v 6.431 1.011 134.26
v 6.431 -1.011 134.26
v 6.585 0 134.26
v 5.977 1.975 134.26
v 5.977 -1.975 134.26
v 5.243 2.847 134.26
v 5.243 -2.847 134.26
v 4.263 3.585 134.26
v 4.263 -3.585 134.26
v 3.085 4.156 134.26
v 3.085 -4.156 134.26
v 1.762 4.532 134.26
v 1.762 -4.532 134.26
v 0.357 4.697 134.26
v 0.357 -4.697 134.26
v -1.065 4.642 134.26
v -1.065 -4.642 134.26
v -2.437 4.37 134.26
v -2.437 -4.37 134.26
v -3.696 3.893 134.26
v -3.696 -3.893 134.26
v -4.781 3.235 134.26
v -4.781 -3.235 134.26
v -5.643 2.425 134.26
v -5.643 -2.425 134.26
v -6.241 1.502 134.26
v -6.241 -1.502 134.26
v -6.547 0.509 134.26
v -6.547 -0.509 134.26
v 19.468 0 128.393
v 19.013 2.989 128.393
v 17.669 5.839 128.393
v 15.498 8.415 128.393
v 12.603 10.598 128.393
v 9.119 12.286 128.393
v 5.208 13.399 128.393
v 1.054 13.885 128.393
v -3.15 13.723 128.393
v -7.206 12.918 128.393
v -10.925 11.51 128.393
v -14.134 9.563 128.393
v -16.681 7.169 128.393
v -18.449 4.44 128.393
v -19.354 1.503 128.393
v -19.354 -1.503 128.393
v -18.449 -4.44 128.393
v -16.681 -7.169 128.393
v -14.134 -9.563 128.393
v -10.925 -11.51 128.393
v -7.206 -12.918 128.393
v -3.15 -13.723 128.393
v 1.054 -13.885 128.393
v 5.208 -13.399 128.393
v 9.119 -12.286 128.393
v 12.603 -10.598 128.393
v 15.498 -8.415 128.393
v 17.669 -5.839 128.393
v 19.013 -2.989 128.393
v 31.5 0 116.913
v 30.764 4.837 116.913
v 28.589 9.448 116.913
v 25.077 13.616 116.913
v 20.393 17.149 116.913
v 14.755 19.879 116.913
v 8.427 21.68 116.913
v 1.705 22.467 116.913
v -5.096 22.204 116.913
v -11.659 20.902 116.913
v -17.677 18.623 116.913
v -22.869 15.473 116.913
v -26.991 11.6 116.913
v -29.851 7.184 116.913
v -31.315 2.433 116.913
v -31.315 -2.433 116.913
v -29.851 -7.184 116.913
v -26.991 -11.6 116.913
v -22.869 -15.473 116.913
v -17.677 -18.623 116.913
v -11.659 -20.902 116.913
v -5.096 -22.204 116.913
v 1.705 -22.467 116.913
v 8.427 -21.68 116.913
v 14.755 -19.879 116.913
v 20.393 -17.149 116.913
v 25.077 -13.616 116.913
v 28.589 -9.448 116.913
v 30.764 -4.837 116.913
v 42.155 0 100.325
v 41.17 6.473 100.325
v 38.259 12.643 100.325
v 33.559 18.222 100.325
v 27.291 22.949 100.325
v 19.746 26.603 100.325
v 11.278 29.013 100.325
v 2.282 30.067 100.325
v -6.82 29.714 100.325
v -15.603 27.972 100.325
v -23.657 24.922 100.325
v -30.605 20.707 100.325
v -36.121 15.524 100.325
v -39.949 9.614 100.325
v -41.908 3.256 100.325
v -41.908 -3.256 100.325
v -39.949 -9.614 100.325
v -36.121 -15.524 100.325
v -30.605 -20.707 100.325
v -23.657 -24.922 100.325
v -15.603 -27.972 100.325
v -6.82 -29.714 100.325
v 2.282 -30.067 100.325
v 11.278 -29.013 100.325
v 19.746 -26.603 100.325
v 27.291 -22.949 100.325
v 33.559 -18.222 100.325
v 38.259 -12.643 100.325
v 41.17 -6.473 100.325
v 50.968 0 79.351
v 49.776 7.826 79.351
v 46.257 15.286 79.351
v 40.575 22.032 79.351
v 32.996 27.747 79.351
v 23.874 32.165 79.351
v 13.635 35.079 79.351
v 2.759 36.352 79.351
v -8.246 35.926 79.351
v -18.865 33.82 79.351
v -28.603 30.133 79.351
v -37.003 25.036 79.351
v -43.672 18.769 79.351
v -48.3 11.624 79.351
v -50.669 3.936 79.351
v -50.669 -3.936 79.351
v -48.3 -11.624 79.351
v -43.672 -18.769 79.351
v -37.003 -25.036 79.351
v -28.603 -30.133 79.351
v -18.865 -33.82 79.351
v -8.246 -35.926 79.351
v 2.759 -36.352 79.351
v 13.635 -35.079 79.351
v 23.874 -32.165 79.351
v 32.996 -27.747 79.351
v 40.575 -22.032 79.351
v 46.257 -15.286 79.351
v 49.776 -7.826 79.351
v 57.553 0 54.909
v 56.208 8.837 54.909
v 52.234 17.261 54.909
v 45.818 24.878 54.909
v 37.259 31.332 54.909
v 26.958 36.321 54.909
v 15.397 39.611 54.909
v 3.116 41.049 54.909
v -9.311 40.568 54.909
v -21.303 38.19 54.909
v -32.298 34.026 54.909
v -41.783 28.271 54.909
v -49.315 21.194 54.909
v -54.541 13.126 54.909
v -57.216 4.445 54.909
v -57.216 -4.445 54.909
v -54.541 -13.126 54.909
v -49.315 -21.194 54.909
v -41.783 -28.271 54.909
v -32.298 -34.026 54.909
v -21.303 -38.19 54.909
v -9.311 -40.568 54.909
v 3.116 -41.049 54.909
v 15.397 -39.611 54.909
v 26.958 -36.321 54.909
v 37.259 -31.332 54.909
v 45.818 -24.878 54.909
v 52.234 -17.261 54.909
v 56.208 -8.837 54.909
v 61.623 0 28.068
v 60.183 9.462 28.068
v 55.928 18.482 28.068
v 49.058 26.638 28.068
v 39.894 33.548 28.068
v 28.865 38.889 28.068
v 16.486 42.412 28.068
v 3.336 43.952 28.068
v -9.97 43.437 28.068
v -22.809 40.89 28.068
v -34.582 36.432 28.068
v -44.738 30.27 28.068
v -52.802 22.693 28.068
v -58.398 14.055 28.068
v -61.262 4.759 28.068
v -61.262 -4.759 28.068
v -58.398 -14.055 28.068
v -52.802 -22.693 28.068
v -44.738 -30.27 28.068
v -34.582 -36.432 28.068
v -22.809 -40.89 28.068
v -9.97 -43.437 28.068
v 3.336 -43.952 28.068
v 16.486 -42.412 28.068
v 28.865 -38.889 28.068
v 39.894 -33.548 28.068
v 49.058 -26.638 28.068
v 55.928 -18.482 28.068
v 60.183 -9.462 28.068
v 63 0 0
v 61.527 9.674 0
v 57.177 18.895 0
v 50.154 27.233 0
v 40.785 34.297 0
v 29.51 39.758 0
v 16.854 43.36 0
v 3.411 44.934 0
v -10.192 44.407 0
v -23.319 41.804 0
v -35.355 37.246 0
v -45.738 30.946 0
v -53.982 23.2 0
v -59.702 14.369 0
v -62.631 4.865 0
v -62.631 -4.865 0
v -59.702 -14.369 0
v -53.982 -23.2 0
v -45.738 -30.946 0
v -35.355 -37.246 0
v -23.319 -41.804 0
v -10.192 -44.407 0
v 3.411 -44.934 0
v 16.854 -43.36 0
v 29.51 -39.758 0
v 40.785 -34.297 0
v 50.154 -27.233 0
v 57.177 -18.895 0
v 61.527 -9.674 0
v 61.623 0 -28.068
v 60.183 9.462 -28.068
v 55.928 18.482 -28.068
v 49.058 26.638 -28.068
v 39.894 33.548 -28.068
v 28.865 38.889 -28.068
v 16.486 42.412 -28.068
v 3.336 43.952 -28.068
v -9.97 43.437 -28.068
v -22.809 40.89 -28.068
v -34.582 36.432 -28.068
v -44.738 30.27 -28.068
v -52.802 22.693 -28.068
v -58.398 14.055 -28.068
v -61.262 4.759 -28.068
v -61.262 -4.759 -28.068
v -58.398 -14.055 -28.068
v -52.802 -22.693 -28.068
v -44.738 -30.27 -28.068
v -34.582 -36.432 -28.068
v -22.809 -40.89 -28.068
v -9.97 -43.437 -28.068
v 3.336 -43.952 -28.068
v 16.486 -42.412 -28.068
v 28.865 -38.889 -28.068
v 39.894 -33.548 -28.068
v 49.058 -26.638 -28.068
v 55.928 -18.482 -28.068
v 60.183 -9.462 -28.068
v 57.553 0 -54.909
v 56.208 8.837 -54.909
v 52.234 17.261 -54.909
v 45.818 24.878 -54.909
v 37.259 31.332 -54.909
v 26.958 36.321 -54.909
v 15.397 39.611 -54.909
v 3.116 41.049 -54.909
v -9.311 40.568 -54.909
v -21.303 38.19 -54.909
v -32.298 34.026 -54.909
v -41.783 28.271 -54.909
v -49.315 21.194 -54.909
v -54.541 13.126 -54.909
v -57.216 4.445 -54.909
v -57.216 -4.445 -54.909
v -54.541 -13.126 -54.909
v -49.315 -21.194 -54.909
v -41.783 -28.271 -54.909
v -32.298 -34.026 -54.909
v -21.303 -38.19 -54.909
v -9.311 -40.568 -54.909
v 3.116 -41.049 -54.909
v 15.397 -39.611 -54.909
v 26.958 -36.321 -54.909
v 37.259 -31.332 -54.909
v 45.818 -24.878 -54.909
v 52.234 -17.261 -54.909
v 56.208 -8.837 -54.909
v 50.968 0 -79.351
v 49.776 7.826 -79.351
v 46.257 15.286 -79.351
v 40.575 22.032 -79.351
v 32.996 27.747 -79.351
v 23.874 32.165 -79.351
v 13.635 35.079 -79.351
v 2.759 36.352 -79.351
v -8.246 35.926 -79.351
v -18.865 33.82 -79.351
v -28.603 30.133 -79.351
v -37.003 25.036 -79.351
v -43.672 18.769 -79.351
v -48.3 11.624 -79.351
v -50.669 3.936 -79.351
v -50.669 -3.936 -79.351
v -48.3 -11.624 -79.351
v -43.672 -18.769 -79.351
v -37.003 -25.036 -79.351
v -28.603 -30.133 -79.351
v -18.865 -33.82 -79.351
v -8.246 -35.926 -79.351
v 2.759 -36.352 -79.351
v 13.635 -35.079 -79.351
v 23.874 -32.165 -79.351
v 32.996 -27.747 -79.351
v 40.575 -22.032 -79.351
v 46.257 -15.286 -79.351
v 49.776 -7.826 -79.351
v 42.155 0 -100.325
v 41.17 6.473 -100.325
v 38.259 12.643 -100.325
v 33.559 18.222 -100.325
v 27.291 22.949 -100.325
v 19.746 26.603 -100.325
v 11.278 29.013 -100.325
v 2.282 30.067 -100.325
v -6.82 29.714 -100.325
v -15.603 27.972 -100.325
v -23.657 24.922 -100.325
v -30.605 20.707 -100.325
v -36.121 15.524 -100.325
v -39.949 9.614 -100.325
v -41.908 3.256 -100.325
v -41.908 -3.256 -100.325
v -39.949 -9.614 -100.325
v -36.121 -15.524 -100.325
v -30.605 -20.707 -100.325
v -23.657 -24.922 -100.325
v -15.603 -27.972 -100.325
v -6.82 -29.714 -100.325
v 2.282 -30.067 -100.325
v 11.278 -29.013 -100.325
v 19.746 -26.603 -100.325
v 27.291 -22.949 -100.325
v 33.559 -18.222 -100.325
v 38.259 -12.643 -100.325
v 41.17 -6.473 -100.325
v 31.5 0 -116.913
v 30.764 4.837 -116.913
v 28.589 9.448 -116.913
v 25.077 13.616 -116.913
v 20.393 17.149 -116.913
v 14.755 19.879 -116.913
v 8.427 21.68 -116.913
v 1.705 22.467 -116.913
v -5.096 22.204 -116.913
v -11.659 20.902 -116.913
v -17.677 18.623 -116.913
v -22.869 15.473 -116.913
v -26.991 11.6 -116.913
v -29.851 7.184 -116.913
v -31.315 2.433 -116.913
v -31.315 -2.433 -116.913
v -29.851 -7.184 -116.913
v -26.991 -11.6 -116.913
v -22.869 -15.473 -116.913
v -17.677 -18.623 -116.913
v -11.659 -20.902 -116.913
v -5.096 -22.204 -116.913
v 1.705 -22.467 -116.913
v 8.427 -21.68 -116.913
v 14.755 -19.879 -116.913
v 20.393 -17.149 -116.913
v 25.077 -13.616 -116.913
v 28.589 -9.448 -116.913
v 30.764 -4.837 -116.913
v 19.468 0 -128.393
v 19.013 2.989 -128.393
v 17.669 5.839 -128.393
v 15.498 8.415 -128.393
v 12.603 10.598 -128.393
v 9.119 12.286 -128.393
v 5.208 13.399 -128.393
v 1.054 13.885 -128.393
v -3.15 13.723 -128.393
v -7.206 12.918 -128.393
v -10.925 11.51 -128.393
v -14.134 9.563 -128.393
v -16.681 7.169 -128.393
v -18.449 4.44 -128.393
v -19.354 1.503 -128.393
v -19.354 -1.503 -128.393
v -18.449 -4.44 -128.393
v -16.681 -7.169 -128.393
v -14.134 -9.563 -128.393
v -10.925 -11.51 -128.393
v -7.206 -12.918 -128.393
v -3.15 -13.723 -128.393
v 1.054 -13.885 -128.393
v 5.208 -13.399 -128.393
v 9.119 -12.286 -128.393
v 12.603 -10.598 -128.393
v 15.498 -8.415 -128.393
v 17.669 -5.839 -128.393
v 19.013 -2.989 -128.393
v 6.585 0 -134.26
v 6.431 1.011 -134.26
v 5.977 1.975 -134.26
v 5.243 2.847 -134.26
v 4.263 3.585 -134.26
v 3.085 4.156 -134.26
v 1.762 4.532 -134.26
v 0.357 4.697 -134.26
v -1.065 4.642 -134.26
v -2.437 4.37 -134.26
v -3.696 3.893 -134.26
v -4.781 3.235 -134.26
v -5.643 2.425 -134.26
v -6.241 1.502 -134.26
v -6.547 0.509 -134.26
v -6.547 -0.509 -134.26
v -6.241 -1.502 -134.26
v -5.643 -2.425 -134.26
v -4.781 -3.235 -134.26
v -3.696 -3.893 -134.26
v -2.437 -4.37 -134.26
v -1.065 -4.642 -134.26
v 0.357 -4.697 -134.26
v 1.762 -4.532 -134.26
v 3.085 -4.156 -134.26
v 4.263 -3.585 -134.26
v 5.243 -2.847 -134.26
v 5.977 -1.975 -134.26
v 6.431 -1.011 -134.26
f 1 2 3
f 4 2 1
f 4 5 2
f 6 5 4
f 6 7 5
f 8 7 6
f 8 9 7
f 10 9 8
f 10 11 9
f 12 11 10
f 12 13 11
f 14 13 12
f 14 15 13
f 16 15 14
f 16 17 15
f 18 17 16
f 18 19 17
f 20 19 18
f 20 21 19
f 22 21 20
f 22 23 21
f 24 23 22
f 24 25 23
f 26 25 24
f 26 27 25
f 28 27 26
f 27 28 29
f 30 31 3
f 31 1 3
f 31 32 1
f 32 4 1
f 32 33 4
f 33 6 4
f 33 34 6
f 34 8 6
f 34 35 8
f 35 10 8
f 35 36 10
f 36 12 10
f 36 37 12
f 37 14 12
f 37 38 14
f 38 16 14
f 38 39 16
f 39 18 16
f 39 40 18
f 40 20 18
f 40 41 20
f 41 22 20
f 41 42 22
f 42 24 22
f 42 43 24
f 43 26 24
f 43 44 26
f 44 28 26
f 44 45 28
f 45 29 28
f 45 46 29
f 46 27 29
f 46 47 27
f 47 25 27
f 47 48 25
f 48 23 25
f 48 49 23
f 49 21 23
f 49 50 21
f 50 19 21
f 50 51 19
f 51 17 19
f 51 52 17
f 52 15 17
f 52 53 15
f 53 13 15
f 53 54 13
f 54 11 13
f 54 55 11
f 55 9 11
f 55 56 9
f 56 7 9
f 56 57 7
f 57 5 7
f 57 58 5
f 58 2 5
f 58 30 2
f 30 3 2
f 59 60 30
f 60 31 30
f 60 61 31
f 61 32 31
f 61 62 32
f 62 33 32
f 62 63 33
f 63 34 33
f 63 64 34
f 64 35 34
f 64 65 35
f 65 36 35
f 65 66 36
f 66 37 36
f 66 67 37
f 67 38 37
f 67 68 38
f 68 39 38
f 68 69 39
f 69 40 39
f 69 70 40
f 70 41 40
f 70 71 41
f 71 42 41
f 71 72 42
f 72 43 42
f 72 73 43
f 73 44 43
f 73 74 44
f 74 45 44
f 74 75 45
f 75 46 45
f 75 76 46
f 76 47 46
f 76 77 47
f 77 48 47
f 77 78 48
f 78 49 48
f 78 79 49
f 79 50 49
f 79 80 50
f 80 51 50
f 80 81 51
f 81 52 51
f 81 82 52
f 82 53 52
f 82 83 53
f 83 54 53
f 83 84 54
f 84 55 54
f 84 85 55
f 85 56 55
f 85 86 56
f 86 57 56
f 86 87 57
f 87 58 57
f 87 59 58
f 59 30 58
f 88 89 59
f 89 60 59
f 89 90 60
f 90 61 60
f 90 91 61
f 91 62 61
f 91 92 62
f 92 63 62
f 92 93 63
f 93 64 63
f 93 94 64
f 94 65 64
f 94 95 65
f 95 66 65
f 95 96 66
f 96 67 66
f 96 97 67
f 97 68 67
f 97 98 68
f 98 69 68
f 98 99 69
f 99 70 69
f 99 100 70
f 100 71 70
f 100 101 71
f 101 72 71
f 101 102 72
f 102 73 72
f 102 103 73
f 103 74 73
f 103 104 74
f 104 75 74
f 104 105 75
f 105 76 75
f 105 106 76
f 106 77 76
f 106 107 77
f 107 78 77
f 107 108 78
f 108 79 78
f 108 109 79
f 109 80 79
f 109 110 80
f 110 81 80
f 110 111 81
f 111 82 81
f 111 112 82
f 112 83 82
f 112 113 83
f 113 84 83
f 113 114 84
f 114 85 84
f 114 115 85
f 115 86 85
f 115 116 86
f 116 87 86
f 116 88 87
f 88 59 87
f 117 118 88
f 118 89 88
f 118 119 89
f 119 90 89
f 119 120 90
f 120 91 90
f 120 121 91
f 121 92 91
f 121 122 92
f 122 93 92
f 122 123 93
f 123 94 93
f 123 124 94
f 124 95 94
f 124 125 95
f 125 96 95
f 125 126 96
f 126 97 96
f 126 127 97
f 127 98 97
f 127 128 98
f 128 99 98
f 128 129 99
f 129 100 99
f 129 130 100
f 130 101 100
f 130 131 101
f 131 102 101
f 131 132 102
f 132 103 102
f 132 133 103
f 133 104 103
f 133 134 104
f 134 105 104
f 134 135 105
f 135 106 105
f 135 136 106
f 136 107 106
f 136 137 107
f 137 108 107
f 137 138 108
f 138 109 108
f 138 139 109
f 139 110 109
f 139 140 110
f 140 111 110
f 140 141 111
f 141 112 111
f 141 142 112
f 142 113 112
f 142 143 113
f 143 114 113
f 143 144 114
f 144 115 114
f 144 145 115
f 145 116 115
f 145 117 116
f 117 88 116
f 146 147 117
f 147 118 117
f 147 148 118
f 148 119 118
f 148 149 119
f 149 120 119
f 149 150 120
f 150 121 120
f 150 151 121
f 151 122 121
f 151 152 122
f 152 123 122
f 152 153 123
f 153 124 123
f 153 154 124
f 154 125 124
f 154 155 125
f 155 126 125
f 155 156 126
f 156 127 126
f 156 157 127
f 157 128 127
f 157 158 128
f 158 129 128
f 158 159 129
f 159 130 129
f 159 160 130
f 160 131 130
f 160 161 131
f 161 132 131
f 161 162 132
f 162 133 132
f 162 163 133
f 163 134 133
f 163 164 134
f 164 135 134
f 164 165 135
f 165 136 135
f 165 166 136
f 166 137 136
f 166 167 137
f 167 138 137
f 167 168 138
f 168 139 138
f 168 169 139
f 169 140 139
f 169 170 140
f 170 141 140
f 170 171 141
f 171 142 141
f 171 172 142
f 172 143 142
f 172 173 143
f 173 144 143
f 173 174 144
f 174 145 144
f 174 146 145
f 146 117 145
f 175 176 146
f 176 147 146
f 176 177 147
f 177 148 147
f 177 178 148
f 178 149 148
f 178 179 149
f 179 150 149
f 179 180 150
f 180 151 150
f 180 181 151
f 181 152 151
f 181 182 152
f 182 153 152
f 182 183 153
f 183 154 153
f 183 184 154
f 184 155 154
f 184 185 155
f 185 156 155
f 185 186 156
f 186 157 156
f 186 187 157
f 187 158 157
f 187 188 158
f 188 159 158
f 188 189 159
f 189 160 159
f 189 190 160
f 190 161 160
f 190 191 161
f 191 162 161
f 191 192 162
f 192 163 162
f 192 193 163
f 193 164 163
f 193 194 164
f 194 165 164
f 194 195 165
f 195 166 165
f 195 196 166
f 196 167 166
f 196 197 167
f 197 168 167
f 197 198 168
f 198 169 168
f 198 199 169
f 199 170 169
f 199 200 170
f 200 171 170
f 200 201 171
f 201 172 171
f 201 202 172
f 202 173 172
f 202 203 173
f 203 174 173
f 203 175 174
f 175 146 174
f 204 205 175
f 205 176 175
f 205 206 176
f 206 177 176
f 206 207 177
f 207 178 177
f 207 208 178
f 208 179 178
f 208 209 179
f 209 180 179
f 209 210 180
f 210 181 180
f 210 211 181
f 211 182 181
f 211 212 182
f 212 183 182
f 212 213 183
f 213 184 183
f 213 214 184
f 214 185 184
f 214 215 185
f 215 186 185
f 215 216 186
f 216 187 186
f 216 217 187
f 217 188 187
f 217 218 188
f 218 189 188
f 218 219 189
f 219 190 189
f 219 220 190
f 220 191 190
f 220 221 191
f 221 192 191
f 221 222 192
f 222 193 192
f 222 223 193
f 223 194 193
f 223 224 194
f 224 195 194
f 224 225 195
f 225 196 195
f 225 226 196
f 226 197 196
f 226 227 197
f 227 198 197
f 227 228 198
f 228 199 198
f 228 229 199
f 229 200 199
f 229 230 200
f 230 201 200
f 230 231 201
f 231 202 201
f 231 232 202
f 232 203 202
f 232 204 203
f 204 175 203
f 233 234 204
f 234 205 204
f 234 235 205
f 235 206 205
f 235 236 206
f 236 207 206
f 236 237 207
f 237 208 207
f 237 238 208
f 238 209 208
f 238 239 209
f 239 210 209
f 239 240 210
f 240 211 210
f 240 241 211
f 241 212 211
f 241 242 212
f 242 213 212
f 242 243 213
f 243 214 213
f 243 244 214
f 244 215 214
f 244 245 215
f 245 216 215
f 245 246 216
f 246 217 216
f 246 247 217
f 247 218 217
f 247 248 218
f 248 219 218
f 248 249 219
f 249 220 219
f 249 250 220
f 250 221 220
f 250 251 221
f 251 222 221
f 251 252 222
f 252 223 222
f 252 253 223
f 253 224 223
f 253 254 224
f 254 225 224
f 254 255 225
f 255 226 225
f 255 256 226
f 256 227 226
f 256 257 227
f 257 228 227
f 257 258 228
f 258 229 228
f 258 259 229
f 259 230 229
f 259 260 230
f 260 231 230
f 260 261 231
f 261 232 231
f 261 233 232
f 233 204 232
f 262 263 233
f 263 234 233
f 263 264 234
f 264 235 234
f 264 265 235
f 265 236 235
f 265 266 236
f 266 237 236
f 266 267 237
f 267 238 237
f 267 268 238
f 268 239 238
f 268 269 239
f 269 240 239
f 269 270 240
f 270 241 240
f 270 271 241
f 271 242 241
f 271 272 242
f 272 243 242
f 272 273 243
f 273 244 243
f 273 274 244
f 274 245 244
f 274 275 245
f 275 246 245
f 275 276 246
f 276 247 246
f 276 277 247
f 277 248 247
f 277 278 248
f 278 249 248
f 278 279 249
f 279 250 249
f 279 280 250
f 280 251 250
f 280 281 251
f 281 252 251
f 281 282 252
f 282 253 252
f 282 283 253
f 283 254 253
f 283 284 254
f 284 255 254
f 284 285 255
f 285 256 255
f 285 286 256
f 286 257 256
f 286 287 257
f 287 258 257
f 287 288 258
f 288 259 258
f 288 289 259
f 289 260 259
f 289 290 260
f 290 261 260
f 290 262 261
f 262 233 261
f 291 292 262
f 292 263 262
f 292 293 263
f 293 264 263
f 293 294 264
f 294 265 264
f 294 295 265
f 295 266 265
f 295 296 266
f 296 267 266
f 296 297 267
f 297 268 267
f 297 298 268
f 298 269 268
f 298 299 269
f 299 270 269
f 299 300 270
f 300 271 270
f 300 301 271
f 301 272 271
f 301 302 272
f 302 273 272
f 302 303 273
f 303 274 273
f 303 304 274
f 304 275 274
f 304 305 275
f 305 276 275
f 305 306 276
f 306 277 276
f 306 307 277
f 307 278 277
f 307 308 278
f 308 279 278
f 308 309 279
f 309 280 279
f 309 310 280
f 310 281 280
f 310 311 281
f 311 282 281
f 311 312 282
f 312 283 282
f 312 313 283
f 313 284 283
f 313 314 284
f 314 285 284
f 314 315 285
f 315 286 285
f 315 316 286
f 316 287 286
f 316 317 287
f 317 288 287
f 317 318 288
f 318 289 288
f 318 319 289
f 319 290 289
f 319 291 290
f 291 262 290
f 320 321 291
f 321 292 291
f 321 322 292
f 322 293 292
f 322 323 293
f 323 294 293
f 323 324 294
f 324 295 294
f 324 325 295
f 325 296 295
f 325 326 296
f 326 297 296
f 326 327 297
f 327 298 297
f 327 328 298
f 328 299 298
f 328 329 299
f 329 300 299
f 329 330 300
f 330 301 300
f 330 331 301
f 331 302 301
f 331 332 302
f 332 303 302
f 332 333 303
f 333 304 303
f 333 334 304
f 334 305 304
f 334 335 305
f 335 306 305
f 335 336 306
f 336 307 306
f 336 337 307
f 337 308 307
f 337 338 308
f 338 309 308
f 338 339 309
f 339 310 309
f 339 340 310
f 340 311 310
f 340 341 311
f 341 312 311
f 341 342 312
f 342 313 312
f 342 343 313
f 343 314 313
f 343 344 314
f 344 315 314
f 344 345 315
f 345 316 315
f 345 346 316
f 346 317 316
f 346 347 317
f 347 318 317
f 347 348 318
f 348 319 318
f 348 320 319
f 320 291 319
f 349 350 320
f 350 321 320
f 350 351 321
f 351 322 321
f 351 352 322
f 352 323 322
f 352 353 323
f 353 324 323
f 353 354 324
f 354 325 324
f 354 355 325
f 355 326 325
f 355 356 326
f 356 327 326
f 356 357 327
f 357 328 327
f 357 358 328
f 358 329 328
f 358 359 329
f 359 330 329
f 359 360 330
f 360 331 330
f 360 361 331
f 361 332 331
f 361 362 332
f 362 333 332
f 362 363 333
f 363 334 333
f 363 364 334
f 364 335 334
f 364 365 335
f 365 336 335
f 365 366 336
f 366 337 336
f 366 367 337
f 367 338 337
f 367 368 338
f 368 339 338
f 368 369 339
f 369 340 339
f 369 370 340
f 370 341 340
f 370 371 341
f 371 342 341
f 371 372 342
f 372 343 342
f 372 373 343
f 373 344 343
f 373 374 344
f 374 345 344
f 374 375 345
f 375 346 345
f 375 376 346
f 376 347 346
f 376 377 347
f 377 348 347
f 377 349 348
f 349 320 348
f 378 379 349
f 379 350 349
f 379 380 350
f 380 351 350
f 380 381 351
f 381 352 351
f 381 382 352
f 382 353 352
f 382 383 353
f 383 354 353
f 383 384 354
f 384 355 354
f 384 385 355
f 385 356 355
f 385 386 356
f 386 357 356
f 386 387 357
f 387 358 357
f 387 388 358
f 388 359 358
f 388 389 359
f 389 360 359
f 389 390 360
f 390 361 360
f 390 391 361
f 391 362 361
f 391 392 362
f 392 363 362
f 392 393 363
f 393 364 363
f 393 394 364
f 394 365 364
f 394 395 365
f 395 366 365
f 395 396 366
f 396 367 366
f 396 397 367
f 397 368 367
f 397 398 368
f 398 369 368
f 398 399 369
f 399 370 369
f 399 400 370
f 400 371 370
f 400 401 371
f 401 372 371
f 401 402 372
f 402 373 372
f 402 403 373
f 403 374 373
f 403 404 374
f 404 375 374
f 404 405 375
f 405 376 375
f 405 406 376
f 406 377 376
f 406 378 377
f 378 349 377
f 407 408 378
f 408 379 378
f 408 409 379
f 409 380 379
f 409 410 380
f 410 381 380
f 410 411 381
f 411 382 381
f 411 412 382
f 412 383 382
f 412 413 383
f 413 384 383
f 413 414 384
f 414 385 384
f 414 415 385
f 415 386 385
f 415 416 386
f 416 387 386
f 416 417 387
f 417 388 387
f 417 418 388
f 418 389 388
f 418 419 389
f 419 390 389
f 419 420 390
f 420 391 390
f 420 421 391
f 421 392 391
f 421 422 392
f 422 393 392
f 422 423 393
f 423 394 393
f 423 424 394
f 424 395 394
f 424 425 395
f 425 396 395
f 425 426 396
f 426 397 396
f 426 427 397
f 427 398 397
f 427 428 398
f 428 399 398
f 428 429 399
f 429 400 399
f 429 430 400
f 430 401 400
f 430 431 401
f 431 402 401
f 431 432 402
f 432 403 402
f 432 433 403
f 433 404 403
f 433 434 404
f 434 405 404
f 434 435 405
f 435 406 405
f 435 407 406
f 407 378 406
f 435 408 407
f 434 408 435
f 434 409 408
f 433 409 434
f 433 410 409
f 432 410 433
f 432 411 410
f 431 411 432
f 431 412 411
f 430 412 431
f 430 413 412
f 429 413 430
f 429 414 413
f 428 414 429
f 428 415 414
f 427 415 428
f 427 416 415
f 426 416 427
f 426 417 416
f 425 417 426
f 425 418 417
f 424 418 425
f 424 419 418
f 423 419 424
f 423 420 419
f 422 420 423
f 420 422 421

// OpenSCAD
// Generated by SolidPython 1.0.1 on 2020-07-29 00:46:47


scale(v = [7, 5, 15]) {
	sphere(r = 9);
}
/***********************************************
*********      SolidPython code:      **********
************************************************
 
# import packages: SolidPython
from solid import *
from solid.utils import *
from itertools import chain, combinations, permutations


class Resize:

    def __init__(self, scad_file):
        self.scad_file = scad_file
        #self.scad_file = import_scad(scad_file)
        # cone/cylinder param:
        self.r1 = 0
        self.r2 = 0
        self.h = 0
        # rectangular prism param:
        self.w = 0
        self.l = 0
        # ellipse param:
        self.r = 0

    # import OpenScad code (file name corresponds to shape)


    # classify shape + parameters
    def assign(self, param1, param2, param3):
        if self.scad_file == 'cone.scad':
            self.r1 = param1
            self.r2 = param2
            self.h = param3
        elif self.scad_file == 'cylinder.scad':
            self.r1 = param1
            self.r2 = param2
            self.h = param3
        elif self.scad_file == 'rectangularPrism.scad':
            self.h = param1
            self.l = param2
            self.w = param3
        else:
            self.r = param1
            self.h = param2

    # resize parameters
    def iterate(self):
        x = range(3, 20, 2)
        i = 1
        if self.scad_file == 'cone.scad':
            tempList = list(permutations(x, 2))
            for temp in tempList:
                param1 = temp[0]
                param2 = temp[1]
                filepath = 'produced_scad_files/' + 'cone' + str(param1) + '_' + str(param2) + '_' + '.scad'
                scad_render_to_file(cylinder(h=param1, r1=param2, r2=0), filepath)

        elif self.scad_file == 'cylinder.scad':
            tempList = list(permutations(x, 3))
            for temp in tempList:
                param1 = temp[0]
                param2 = temp[1]
                filepath = 'produced_scad_files/' + 'cylinder' + str(param1) + '_' + str(param2) + '_' + '.scad'
                scad_render_to_file(cylinder(h=param1, r1=param2, r2=param2), filepath)

        elif self.scad_file == 'rectangularPrism.scad':
            tempList = list(permutations(x, 3))
            for temp in tempList:
                param1 = temp[0]
                param2 = temp[1]
                param3 = temp[2]
                filepath = 'produced_scad_files/' + 'rectangularPrism' + str(param1) + '_' + str(param2) + '_' + str(
                    param3) + '.scad'
                scad_render_to_file(cube(size=(param1, param2, param3)), filepath)

        elif self.scad_file == 'ellipse.scad':
            tempList = list(permutations(x, 4))
            for temp in tempList:
                param1 = temp[0]
                param2 = temp[1]
                param3 = temp[2]
                param4 = temp[3]
                filepath = 'produced_scad_files/' + 'ellipse' + str(param1) + '_' + str(param2) + '_' + str(param3) + '_' + str(param4) + '.scad'
                scad_render_to_file(scale([param1, param2, param3])(sphere(r=param4)), filepath)

    def render_to_scadfile(self):
        scad_render_to_file(scad, 'example.scad') 
 
************************************************/
